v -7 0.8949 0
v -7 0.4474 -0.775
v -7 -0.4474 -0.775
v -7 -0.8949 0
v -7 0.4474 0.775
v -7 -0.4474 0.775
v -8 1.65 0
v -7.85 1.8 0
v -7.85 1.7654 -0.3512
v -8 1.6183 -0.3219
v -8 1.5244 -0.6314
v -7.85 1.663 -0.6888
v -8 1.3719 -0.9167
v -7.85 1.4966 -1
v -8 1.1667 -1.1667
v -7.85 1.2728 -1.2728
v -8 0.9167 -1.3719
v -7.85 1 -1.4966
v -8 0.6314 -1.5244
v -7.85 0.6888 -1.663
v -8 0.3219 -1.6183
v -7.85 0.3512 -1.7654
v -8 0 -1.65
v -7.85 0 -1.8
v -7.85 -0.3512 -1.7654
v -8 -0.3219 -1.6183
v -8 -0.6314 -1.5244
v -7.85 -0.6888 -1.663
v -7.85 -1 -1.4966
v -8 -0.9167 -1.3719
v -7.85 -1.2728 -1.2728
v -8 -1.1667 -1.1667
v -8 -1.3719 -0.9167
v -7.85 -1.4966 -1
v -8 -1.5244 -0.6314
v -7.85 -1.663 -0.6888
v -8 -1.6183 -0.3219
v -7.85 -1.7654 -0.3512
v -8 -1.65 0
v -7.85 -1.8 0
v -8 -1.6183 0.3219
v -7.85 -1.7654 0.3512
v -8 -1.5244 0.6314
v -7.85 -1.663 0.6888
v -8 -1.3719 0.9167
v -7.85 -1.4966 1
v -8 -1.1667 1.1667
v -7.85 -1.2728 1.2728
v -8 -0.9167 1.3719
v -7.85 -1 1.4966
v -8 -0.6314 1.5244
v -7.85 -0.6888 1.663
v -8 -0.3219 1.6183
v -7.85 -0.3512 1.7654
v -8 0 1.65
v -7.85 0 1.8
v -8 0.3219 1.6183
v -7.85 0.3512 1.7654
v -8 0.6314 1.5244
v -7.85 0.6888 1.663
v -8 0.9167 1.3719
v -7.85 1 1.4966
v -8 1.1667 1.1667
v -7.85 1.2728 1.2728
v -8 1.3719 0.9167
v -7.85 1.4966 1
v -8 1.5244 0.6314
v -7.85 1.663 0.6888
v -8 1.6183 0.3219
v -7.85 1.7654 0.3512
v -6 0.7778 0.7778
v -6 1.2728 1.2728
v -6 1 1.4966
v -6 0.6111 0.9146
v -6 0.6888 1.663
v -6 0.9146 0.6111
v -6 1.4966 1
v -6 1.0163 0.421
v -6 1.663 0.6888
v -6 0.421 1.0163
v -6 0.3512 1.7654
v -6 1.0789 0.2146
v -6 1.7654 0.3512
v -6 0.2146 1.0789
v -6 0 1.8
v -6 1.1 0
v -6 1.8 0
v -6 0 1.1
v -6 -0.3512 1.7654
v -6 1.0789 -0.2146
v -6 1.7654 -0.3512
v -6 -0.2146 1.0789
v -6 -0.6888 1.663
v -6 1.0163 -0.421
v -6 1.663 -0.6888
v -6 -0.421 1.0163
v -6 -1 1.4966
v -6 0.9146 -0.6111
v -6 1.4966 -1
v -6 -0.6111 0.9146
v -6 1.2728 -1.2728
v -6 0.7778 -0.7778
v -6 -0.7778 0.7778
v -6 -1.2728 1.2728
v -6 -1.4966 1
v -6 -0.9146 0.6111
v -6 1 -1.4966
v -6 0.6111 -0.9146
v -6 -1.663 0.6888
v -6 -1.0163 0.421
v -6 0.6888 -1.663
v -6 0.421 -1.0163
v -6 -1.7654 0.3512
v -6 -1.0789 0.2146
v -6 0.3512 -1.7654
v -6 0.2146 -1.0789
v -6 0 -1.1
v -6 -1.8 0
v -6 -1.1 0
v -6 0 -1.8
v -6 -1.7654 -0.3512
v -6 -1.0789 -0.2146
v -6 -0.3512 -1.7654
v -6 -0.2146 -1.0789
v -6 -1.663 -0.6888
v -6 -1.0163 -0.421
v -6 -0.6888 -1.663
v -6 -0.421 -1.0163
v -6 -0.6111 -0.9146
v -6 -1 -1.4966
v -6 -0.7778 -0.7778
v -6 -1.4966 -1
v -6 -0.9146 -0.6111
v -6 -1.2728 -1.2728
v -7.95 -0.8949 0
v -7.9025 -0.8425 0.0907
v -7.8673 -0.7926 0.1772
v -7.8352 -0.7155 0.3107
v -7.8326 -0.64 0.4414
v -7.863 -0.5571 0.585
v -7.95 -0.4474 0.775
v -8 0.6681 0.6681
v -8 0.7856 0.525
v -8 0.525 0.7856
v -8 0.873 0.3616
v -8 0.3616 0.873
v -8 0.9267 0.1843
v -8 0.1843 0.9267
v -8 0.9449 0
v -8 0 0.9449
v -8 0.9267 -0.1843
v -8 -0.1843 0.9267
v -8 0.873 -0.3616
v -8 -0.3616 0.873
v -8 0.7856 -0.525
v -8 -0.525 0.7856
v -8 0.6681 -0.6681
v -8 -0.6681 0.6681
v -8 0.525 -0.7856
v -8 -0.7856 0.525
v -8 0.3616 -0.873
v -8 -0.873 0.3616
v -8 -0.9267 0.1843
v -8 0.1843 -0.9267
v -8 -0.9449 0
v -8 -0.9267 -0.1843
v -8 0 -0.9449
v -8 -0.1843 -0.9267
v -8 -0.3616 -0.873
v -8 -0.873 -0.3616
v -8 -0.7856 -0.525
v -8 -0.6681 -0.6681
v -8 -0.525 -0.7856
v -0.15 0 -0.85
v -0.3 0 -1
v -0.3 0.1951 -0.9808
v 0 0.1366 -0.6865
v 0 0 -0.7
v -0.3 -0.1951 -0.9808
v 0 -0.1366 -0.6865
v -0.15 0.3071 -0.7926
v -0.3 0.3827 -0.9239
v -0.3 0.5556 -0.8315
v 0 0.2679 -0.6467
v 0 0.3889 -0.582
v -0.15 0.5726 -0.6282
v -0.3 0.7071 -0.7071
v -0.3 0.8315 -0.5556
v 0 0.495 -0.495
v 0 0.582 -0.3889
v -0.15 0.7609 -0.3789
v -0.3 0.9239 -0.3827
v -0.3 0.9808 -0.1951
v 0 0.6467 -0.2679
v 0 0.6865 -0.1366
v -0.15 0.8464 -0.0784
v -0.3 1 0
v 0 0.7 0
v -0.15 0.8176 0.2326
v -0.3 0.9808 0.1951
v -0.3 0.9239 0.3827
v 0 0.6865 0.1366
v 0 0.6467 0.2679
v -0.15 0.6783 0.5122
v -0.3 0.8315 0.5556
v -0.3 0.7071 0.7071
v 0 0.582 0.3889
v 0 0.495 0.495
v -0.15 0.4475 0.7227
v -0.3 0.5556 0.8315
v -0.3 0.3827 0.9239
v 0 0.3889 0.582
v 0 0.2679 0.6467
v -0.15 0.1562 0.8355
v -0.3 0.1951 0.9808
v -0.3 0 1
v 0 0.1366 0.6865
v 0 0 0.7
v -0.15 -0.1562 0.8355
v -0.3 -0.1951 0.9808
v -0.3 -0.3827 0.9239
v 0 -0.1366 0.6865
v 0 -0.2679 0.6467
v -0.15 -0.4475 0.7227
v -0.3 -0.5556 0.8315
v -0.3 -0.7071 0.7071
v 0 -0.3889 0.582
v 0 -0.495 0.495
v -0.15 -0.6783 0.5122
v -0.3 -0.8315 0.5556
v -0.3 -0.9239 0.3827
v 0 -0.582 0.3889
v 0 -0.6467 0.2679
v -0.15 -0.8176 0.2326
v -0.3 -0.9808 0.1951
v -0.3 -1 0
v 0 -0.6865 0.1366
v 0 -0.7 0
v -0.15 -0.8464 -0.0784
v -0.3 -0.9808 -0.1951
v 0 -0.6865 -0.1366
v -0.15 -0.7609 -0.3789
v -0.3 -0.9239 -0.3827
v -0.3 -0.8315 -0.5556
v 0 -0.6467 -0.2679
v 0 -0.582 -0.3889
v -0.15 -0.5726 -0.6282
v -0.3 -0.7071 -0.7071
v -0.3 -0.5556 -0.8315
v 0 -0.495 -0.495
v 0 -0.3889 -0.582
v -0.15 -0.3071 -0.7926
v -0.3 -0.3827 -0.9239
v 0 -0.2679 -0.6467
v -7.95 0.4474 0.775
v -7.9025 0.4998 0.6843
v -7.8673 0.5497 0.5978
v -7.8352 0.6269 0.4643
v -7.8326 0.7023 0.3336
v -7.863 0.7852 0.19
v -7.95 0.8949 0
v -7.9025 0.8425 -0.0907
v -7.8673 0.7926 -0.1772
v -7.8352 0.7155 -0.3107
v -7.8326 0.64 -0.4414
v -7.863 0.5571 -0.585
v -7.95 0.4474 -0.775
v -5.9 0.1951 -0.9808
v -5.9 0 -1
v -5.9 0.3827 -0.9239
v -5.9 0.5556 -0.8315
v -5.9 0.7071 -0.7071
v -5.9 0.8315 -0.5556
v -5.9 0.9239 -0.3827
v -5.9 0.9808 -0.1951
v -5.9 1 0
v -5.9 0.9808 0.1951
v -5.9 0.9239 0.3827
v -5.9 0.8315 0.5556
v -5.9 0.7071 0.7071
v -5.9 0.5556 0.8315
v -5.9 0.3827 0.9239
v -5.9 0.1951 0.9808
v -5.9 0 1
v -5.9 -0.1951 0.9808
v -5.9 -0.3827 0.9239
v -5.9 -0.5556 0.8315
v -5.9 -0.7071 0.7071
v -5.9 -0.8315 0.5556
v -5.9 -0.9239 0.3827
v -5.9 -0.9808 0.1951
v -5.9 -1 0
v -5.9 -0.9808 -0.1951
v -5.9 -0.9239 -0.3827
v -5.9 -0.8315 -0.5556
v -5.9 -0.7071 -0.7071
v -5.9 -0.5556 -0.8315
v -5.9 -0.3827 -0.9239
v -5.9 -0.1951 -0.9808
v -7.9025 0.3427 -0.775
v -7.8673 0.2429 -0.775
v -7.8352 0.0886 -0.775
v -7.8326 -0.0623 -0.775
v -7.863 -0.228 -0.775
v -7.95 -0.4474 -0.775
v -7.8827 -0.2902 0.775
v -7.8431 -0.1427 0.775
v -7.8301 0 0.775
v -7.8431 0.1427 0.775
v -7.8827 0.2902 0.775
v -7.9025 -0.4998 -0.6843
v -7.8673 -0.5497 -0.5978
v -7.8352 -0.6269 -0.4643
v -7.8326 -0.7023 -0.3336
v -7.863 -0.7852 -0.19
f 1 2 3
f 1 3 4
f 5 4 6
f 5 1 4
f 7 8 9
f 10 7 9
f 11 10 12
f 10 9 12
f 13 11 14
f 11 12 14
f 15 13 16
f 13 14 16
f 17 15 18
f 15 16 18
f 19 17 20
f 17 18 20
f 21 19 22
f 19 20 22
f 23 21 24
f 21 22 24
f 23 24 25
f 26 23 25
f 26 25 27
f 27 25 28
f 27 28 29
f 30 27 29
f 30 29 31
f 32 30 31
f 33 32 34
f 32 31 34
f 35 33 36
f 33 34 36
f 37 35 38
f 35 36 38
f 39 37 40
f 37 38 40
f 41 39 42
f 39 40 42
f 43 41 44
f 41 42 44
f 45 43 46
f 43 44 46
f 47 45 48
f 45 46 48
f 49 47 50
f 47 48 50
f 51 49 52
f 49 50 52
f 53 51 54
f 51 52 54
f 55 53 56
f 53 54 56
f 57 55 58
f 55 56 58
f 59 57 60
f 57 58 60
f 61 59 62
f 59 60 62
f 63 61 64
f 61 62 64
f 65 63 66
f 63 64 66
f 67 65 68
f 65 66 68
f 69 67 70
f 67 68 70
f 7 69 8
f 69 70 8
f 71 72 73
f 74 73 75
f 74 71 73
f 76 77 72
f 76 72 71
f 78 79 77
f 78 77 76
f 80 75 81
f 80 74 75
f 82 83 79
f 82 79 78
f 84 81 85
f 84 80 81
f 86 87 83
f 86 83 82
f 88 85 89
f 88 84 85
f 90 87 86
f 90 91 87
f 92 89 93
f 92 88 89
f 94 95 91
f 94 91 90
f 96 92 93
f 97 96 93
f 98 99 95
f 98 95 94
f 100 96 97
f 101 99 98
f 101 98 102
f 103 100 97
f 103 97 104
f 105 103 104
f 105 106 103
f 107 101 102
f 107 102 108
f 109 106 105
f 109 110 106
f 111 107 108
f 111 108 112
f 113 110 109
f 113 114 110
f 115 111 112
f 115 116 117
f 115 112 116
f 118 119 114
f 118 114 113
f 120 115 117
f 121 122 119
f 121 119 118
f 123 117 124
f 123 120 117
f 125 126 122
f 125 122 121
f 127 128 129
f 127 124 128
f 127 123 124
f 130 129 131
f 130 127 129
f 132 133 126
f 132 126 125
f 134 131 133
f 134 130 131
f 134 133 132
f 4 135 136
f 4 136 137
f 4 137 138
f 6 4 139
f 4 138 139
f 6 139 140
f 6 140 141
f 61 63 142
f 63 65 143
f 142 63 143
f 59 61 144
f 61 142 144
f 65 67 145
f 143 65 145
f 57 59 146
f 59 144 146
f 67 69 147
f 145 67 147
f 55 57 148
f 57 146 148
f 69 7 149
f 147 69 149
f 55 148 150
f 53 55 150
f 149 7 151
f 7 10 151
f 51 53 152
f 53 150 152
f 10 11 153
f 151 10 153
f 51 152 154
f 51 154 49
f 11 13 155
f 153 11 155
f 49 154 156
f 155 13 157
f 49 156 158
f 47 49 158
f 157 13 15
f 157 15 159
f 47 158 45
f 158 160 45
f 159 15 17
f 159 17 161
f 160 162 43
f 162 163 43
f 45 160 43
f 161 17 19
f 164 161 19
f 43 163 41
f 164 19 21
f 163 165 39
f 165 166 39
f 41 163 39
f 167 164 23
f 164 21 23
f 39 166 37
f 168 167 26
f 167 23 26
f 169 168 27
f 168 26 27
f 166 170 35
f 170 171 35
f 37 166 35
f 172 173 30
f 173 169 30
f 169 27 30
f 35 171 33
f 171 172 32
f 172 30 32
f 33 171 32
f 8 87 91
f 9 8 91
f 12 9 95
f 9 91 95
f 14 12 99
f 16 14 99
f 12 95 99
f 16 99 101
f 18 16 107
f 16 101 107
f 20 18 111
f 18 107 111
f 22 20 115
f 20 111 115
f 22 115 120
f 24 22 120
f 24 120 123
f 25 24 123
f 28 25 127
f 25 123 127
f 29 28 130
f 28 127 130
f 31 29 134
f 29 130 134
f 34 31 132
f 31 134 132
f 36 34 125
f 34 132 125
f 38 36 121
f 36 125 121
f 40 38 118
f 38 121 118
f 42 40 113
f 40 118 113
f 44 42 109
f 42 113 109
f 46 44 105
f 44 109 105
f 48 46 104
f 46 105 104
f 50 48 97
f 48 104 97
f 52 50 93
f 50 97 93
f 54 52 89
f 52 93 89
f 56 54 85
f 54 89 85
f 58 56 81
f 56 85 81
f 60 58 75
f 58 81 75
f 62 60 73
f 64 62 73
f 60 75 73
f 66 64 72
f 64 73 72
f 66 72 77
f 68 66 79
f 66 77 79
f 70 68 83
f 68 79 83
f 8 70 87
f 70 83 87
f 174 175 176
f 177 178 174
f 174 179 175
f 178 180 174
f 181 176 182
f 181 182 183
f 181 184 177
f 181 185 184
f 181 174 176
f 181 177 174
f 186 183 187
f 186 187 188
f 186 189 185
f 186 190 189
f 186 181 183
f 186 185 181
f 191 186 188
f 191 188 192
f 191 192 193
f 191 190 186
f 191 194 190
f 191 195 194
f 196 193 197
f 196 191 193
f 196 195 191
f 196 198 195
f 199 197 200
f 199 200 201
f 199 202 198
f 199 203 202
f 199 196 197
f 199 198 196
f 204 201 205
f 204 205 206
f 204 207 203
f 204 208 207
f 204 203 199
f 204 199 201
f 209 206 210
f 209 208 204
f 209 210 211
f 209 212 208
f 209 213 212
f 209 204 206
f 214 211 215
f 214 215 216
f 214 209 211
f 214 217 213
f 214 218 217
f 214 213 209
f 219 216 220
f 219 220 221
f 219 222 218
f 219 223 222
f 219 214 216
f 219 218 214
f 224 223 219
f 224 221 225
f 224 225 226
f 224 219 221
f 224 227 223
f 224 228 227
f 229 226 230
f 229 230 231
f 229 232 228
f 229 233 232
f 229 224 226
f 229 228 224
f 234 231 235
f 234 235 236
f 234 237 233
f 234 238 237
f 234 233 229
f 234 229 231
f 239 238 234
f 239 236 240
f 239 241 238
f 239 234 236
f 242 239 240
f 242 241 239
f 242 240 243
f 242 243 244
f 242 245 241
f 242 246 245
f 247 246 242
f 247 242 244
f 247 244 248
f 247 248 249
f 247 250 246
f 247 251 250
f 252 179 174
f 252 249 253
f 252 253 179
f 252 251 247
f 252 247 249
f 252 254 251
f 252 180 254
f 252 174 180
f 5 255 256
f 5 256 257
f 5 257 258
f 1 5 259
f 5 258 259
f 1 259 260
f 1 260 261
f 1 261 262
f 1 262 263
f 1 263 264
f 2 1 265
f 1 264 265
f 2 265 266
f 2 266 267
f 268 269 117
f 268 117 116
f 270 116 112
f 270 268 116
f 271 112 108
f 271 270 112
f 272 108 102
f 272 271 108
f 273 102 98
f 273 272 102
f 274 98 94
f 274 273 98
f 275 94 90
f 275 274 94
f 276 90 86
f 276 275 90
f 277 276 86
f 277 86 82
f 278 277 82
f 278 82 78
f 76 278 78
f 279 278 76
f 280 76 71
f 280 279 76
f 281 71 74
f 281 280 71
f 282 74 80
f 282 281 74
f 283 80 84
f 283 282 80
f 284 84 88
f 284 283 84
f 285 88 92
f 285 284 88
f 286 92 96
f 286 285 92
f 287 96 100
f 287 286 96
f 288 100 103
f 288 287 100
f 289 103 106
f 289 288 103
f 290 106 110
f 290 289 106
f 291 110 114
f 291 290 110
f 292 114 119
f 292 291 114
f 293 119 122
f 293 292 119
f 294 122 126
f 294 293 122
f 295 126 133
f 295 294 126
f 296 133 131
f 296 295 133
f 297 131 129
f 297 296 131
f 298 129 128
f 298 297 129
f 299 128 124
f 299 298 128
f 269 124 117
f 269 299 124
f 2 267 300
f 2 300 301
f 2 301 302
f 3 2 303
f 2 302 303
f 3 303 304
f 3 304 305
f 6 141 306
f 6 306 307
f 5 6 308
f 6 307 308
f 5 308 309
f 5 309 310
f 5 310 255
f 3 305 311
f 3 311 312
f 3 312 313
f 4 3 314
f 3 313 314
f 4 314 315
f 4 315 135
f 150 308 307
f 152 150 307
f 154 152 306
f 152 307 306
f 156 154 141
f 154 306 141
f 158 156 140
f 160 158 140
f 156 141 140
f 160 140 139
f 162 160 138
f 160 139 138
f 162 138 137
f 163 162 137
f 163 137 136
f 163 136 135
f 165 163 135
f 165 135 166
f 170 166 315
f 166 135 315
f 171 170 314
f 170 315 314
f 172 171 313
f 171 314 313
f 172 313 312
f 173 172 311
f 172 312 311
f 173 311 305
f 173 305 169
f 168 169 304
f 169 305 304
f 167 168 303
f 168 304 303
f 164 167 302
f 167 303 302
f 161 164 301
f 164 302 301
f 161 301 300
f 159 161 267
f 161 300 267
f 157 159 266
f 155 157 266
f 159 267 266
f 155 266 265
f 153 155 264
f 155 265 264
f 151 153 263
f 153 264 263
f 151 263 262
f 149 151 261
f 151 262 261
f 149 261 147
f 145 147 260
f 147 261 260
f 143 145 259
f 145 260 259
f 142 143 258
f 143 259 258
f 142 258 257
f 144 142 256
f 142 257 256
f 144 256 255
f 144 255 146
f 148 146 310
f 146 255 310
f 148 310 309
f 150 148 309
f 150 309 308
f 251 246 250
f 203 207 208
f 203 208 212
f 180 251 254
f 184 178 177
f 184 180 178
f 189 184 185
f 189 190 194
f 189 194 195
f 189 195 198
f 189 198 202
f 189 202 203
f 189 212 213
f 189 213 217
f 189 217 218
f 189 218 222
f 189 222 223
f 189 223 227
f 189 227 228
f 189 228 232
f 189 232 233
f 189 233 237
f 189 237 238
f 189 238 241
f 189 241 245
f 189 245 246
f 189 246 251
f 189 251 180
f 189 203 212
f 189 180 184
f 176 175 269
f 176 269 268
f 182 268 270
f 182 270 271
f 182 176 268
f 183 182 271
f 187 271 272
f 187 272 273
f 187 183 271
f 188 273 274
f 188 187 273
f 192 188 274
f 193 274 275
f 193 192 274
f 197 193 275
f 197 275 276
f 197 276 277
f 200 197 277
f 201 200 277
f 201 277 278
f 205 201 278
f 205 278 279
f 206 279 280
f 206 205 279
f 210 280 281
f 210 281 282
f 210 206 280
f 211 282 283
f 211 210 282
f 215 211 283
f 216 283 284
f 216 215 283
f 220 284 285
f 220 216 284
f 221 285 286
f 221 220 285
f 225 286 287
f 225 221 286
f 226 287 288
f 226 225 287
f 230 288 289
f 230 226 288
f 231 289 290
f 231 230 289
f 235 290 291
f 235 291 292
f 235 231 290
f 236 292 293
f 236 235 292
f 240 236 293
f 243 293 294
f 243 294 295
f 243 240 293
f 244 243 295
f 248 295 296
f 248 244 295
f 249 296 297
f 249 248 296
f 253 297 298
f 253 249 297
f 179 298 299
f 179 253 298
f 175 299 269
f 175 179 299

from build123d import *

# Parameters (mm, degrees)
SKETCH2_R           = 1
BOSS_EXTRUDE1_DEPTH = 6
CHAMFER1_SIZE       = 0.3
SKETCH6_W           = 2
SKETCH6_H           = 1.8
CUT_EXTRUDE1_DEPTH  = 1
CHAMFER2_SIZE       = 0.15
CHAMFER3_SIZE       = 0.1


with BuildPart() as part:
    # Sketch2 → Boss-Extrude1 (new body)
    with BuildSketch(Plane(origin=(0, 0, 0), x_dir=(0, 0, -1), z_dir=(1, 0, 0))):
        Circle(SKETCH2_R)
    extrude(amount=-BOSS_EXTRUDE1_DEPTH)

    # Chamfer1
    chamfer1_edges = [part.edges().sort_by_distance(p)[0] for p in [
        (0, 0, 1),
    ]]
    chamfer(chamfer1_edges, length=CHAMFER1_SIZE)

    # Sketch6 → Revolve1 (revolve)
    with BuildSketch(Plane.XY):
        with Locations((-7, 0.9)):
            Rectangle(SKETCH6_W, SKETCH6_H)
    revolve(axis=Axis((-6, 0, 0), (-1, 0, 0)))

    # Sketch7 → Cut-Extrude1 (cut)
    with BuildSketch(Plane.ZY.offset(8)):
        Polygon((0, 0.894892917), (-0.775, 0.447446459), (-0.775, -0.447446459), (0, -0.894892917), (0.775, -0.447446459), (0.775, 0.447446459), align=None)
    extrude(amount=-CUT_EXTRUDE1_DEPTH, mode=Mode.SUBTRACT)

    # Cut-Extrude2 cone 1 section (through the dimple's axis) → Cut-Extrude2 (revolve, cut)
    with BuildSketch(Plane(origin=(-8, 0, 0), x_dir=(0, 0, 1), z_dir=(0, 1, 0))):
        Polygon((0, 0), (0.944892917, 0), (0, 0.944892917), align=None)
    revolve(axis=Axis((-8, 0, 0), (1, 0, 0)), mode=Mode.SUBTRACT)

    # Chamfer2
    chamfer2_edges = [part.edges().sort_by_distance(p)[0] for p in [
        (-8, -1.8, 0),
    ]]
    chamfer(chamfer2_edges, length=CHAMFER2_SIZE)

    # Chamfer3
    chamfer3_edges = [part.edges().sort_by_distance(p)[0] for p in [
        (-6, 0, 1),
    ]]
    chamfer(chamfer3_edges, length=CHAMFER3_SIZE)


solid = part.part
